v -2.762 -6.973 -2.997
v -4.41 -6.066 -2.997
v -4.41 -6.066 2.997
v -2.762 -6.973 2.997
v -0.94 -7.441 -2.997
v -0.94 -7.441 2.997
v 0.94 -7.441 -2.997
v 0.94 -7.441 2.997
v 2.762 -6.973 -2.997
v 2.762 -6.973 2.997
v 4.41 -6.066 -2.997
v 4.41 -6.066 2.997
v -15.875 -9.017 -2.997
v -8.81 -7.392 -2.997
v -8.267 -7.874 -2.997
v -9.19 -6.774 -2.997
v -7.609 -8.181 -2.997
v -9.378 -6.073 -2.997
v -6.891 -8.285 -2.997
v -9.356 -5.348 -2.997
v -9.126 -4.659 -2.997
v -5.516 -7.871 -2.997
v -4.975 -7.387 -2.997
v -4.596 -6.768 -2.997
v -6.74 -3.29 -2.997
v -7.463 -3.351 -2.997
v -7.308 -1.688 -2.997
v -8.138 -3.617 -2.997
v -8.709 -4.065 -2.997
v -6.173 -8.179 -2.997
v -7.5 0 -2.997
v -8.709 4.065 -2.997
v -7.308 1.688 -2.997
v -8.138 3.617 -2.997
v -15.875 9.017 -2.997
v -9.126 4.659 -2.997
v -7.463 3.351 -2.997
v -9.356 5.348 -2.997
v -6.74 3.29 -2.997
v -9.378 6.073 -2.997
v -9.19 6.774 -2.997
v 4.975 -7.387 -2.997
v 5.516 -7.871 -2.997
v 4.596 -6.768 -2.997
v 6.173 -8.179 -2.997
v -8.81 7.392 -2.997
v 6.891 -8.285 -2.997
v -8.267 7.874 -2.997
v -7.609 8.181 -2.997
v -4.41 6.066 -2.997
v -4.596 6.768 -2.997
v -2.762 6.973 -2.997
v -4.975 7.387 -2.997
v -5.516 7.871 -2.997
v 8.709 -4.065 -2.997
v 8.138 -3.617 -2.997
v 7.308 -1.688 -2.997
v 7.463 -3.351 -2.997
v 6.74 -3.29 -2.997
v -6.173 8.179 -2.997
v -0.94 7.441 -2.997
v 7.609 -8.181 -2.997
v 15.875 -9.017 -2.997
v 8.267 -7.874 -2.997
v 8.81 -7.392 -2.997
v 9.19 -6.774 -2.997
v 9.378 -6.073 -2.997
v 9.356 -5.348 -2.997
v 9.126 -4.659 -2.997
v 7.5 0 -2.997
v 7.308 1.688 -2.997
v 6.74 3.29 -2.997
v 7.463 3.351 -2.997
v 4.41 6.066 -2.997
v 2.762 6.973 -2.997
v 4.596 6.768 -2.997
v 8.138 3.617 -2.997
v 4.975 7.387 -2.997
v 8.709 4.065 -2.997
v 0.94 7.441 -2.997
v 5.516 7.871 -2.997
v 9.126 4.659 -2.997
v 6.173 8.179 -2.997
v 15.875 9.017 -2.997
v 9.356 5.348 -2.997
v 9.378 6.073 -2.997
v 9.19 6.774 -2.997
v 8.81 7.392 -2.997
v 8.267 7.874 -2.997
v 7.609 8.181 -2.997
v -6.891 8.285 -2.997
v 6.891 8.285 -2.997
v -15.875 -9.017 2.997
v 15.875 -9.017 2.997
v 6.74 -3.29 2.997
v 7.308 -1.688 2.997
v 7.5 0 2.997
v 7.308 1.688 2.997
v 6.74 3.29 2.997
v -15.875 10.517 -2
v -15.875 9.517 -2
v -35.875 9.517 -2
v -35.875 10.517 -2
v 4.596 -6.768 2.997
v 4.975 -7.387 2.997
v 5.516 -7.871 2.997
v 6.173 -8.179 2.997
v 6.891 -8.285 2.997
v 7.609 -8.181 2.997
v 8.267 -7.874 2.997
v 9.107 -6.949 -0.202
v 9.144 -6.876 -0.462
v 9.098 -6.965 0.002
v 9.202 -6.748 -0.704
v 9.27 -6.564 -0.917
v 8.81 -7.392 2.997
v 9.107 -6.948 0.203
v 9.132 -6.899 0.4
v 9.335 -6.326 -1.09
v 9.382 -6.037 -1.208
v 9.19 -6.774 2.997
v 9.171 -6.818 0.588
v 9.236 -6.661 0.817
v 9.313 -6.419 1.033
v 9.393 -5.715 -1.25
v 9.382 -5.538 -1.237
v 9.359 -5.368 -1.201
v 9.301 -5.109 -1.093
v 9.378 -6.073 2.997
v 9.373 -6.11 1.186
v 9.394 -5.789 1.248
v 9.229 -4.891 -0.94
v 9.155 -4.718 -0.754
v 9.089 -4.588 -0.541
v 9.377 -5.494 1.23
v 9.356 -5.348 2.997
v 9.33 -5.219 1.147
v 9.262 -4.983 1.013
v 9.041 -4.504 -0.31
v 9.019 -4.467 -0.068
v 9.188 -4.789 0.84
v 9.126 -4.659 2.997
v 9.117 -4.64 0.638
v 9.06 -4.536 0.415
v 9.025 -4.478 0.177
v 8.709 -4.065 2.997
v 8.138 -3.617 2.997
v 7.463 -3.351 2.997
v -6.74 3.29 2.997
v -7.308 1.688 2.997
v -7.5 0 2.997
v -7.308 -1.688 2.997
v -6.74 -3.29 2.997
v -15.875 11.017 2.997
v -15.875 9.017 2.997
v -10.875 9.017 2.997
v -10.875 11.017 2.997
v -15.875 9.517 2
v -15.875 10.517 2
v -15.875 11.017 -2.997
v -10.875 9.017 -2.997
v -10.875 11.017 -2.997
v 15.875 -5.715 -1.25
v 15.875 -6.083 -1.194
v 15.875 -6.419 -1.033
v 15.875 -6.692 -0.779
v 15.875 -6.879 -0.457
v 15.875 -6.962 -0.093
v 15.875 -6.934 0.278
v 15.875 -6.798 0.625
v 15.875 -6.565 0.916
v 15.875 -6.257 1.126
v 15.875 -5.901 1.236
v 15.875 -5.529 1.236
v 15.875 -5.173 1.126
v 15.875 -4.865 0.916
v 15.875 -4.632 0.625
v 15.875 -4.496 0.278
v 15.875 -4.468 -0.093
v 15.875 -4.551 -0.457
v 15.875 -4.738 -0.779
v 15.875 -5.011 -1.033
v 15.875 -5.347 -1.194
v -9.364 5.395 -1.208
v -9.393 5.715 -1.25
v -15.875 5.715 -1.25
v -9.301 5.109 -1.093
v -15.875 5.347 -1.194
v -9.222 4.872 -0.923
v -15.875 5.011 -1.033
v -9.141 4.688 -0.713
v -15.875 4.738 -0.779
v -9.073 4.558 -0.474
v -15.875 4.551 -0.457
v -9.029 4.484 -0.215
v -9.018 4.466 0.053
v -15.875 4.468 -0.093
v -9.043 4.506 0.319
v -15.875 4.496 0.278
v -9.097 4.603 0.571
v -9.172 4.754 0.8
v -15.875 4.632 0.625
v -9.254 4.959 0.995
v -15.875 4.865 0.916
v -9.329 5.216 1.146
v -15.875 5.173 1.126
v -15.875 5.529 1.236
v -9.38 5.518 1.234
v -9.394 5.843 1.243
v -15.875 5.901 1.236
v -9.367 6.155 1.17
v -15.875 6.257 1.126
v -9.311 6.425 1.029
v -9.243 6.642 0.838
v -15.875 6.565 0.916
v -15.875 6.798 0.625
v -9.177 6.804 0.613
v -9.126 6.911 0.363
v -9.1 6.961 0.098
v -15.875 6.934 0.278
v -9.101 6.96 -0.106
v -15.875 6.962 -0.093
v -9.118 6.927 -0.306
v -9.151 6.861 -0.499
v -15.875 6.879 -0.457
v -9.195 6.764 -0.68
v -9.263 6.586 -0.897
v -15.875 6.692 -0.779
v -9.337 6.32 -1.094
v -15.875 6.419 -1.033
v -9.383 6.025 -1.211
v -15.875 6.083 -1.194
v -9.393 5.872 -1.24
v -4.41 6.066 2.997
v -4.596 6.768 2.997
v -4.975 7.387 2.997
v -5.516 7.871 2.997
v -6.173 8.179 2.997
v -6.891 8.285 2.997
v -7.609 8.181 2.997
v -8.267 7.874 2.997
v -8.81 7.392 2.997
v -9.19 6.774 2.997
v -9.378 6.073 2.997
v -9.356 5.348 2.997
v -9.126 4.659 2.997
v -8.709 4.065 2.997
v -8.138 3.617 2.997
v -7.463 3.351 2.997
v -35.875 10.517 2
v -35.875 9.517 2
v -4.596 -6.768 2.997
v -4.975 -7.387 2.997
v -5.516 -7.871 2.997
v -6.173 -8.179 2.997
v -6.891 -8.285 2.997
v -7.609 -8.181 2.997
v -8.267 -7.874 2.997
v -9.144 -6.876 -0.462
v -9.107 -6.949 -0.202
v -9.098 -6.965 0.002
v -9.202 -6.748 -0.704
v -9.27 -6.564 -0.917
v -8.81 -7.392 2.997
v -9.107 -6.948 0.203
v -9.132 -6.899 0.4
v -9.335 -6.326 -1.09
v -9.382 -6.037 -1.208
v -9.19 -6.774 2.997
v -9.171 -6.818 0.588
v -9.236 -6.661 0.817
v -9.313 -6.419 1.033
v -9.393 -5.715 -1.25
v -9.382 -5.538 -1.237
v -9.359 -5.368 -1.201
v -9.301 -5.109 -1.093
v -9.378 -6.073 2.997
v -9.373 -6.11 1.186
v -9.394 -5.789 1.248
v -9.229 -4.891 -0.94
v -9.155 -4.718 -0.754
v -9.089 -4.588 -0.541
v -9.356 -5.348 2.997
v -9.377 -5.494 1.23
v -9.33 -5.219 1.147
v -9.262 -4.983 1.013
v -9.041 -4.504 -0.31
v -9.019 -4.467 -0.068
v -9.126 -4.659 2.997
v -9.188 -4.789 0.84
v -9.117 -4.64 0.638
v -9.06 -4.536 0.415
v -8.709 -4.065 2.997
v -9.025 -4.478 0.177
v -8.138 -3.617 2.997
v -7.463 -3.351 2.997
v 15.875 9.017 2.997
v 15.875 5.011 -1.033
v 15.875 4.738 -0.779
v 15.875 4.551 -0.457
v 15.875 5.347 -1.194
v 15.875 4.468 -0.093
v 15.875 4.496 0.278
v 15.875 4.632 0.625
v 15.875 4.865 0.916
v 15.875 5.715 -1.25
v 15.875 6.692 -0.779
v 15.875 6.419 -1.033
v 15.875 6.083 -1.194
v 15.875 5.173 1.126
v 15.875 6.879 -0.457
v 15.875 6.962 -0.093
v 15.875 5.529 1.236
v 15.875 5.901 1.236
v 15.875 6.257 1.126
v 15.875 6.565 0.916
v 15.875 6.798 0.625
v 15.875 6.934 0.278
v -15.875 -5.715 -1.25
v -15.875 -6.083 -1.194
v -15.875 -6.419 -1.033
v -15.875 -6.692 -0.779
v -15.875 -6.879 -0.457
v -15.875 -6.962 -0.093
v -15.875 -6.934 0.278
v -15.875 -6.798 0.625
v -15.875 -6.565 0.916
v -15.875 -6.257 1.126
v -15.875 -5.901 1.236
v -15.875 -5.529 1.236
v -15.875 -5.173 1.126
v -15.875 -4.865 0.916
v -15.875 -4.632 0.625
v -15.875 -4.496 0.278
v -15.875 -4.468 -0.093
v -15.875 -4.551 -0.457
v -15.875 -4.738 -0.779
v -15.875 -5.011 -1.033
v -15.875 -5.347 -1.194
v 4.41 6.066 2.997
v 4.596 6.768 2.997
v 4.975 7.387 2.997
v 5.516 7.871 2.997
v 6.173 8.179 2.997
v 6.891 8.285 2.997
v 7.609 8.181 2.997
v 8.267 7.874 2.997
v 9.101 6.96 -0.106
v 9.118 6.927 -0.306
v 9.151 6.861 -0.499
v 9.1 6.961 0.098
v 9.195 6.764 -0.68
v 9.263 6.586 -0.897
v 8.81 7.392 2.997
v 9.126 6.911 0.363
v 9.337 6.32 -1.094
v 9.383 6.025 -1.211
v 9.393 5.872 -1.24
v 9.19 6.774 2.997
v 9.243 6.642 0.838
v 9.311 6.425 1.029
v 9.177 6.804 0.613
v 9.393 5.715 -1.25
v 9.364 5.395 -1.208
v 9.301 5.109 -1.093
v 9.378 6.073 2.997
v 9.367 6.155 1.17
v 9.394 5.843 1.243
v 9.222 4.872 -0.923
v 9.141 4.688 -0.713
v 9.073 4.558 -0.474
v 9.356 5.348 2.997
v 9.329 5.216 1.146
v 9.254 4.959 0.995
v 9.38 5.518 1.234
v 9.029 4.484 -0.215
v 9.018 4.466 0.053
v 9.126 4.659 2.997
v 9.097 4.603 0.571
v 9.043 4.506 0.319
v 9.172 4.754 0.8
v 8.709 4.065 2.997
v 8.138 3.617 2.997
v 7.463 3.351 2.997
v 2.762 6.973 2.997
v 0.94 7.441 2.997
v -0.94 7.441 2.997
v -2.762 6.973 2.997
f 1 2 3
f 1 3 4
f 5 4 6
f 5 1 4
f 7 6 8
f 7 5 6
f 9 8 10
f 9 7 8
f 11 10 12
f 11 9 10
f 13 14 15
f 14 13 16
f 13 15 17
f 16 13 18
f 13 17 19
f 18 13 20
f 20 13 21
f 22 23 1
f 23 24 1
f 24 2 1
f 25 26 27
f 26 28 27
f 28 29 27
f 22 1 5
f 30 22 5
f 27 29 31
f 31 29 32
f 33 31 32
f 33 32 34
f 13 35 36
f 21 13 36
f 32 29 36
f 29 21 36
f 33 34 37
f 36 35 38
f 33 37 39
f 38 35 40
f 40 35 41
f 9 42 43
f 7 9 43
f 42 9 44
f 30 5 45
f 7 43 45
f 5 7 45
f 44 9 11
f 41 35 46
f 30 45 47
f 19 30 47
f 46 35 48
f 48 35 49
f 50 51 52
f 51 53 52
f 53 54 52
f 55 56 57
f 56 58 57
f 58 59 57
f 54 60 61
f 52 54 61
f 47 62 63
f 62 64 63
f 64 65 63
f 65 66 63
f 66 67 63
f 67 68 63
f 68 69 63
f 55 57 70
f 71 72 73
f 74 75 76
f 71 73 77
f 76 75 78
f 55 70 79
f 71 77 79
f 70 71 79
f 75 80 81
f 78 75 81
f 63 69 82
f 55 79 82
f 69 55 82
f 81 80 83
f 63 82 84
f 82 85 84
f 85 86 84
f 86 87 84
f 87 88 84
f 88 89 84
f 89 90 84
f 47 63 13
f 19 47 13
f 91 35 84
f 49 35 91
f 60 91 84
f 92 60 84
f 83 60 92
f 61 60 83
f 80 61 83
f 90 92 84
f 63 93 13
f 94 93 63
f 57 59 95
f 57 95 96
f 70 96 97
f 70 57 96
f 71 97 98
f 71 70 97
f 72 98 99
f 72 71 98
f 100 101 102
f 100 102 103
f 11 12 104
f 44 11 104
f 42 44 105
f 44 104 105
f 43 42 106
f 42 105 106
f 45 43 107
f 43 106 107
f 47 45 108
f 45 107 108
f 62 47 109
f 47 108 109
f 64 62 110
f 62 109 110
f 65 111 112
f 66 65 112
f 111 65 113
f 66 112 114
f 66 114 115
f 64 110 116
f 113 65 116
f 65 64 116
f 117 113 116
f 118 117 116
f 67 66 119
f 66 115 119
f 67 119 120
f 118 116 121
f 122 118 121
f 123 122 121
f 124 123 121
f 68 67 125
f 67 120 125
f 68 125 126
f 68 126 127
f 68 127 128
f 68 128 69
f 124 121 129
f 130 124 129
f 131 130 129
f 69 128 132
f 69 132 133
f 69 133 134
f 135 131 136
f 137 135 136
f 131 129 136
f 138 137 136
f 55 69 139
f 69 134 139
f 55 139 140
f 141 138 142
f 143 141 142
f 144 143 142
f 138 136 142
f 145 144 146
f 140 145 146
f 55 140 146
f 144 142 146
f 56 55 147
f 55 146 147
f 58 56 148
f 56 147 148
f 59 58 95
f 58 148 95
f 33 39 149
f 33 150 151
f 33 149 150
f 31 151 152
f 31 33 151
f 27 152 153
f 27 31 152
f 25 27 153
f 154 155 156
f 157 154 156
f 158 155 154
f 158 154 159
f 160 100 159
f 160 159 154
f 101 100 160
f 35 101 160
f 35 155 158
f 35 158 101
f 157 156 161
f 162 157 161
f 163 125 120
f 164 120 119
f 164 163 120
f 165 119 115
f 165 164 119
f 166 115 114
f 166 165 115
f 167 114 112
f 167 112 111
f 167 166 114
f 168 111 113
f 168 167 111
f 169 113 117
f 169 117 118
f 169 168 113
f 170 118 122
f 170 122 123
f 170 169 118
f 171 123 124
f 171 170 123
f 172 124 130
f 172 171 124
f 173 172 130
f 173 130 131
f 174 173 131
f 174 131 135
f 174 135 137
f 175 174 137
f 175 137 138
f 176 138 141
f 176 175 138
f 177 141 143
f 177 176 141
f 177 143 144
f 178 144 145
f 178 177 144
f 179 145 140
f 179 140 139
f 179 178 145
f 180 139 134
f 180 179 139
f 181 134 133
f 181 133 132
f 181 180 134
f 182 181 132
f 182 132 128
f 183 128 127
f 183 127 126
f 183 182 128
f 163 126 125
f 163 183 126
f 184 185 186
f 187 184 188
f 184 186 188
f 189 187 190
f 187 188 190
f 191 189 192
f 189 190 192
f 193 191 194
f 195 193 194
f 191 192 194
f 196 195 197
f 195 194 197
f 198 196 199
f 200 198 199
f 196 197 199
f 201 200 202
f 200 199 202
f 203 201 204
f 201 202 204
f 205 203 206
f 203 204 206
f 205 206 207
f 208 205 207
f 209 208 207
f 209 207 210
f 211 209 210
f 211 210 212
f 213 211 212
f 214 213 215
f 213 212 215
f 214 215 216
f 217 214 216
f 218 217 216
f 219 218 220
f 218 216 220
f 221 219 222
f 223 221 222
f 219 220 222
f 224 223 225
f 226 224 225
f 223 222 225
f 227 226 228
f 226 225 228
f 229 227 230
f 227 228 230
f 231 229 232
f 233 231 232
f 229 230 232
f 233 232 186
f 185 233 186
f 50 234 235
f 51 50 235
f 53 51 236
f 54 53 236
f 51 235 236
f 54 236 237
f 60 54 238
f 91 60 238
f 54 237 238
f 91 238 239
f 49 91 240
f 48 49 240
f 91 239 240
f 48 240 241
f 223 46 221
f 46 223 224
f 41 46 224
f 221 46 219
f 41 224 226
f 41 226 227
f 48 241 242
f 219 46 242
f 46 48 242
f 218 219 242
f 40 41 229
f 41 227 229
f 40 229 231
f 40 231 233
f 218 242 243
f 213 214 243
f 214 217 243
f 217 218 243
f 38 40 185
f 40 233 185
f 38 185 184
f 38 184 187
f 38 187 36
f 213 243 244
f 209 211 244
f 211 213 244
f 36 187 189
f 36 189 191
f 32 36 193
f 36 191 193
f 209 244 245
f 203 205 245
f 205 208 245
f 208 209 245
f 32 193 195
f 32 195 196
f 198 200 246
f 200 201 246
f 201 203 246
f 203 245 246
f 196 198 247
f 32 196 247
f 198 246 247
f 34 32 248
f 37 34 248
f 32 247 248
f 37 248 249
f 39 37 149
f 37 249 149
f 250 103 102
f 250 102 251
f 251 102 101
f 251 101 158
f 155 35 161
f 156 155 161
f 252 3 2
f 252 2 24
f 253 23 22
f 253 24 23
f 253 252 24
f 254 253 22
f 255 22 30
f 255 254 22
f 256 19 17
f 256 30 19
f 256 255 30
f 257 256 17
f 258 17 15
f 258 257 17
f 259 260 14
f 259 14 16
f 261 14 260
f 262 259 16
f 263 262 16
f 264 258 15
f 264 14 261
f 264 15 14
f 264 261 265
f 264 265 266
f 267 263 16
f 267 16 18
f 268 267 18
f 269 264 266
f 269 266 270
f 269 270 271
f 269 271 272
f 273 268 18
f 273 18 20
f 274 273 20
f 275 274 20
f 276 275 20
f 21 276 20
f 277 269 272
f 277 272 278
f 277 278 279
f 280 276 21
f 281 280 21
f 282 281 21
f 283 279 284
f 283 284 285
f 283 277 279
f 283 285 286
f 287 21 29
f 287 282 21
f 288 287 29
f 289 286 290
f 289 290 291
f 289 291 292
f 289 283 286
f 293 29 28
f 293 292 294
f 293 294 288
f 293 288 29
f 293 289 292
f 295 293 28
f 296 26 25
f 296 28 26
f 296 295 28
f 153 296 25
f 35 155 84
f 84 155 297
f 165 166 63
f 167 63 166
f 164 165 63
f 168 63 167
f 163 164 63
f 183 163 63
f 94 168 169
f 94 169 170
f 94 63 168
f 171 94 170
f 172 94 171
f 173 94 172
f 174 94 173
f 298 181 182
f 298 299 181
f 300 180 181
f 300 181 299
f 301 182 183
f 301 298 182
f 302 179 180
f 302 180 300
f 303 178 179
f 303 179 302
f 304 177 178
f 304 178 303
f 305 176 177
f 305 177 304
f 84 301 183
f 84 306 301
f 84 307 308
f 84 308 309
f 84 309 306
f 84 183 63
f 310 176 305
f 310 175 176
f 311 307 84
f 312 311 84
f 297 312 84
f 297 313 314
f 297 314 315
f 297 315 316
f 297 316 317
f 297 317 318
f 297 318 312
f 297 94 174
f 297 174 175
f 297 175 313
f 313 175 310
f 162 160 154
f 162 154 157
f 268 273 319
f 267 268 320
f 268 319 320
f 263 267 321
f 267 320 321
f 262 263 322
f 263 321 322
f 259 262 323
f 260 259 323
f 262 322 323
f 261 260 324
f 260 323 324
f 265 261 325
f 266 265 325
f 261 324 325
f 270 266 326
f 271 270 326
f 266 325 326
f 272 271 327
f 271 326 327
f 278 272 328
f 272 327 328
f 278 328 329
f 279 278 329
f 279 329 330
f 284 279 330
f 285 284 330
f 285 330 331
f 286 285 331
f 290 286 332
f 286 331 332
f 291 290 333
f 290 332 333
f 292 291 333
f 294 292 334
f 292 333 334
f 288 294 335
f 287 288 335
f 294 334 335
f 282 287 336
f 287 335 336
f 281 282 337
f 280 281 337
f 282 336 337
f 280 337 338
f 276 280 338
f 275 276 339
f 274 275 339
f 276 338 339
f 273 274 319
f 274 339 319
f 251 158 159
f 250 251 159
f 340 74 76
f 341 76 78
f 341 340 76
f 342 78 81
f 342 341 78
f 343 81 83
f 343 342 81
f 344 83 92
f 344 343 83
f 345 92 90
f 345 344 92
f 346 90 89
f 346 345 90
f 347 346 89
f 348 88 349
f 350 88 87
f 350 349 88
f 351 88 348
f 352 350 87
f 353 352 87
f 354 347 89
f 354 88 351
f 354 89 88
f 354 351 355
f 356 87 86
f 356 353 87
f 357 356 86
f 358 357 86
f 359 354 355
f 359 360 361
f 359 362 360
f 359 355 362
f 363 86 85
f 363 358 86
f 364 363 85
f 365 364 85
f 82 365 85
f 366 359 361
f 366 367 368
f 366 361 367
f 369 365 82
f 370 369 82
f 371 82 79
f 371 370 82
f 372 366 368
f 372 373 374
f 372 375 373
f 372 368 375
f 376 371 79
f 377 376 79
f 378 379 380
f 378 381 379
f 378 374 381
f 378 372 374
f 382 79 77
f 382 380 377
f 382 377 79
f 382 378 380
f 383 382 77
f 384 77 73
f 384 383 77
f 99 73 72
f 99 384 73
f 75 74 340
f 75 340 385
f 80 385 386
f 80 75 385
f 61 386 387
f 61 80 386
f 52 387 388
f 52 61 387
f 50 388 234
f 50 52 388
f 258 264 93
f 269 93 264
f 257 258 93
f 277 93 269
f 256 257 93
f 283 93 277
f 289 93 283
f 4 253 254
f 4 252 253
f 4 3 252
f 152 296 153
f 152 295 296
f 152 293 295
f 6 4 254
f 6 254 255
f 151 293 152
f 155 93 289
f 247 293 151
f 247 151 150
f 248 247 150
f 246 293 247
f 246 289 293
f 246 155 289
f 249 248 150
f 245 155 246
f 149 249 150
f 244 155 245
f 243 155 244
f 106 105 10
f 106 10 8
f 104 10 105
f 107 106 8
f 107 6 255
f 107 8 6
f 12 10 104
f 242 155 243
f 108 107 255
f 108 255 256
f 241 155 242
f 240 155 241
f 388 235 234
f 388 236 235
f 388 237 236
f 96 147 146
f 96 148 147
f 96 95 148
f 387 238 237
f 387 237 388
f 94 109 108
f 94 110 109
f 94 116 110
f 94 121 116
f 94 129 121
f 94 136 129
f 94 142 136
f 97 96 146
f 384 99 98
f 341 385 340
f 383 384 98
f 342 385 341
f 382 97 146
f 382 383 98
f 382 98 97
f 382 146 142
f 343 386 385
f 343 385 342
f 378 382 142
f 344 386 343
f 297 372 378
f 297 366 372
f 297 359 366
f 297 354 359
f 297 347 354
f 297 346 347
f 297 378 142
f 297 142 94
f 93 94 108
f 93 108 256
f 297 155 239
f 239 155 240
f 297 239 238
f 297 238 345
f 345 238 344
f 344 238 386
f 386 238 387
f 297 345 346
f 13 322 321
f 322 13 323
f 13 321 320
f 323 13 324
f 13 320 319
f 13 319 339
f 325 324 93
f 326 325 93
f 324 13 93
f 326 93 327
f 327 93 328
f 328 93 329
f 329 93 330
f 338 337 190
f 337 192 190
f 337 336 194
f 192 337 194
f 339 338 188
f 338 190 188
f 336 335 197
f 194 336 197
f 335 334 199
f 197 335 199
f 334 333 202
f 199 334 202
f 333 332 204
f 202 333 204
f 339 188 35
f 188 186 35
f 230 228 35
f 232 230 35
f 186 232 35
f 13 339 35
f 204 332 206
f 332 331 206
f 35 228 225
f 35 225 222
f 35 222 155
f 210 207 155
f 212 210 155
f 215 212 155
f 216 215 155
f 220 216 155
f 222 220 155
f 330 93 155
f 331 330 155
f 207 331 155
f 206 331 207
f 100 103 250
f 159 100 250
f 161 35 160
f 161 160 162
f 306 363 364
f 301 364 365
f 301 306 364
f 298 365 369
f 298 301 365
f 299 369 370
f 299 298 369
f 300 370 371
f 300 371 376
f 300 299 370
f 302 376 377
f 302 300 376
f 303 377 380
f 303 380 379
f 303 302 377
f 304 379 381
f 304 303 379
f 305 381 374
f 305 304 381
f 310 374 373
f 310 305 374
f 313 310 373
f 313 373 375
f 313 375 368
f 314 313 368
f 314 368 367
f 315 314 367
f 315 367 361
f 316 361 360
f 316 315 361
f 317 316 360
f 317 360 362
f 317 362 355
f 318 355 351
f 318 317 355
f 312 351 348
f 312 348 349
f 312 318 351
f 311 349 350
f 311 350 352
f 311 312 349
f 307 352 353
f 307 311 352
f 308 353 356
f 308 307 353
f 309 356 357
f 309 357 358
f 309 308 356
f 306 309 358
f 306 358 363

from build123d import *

# Parameters (mm, degrees)
SKETCH1_W                  = 31.75
SKETCH1_H                  = 18.034
BOSS_EXTRUDE1_DEPTH        = 2.9972
M3_TAPPED_HOLE1_AT_2_COUNT = 2
M3_TAPPED_HOLE1_AT_2_PITCH = 11.43
CUT_EXTRUDE1_DEPTH         = 19.501489719
CUT_EXTRUDE1_DEPTH_BACK    = 19.501489719
SKETCH4_R                  = 7.5
SKETCH5_R                  = 2.5
CUT_EXTRUDE2_DEPTH         = 19.501489719
MIRROR3_COPY_1_SKETCH_R    = 2.5
MIRROR3_COPY_1_DEPTH       = 19.501489719
SKETCH6_W                  = 5
SKETCH6_H                  = 5.9944
BOSS_EXTRUDE2_DEPTH        = 2
SKETCH7_W                  = 4
SKETCH7_H                  = 1
BOSS_EXTRUDE3_DEPTH        = 20


with BuildPart() as part:
    # Sketch1 → Boss-Extrude1 (new, symmetric)
    with BuildSketch(Plane.XY):
        Rectangle(SKETCH1_W, SKETCH1_H)
    extrude(amount=BOSS_EXTRUDE1_DEPTH, both=True)

    # Sketch3 → M3 Tapped Hole1 (revolve, cut)
    with BuildSketch(Plane(origin=(15.875, 5.715, 0), x_dir=(0, 0, -1), z_dir=(0, 1, 0))):
        Polygon((0, 0), (0, 9.251075774), (1.25, 8.5), (1.25, 0), align=None)
    m3_tapped_hole1 = revolve(axis=Axis((22.225, 5.715, 0), (-1, 0, 0)), mode=Mode.SUBTRACT)

    # M3 Tapped Hole1 at 2: M3 Tapped Hole1 ×2
    with Locations(*[(0, -i * M3_TAPPED_HOLE1_AT_2_PITCH, 0) for i in range(1, M3_TAPPED_HOLE1_AT_2_COUNT)]):
        add(m3_tapped_hole1, mode=Mode.SUBTRACT)

    # Mirror1: M3 Tapped Hole1 across plane
    add(m3_tapped_hole1.mirror(Plane(origin=(0, 0, 0), x_dir=(0, 0, 1), z_dir=(1, 0, 0))), mode=Mode.SUBTRACT)

    # Mirror1 copy 1 sketch → Mirror1 copy 1 (revolve, cut)
    with BuildSketch(Plane(origin=(-15.875, -5.715, 0), x_dir=(0, 0, -1), z_dir=(0, 1, 0))):
        Polygon((0, 0), (0, -9.251075774), (1.25, -8.5), (1.25, 0), align=None)
    revolve(axis=Axis((-22.225, -5.715, 0), (-1, 0, 0)), mode=Mode.SUBTRACT)

    # Sketch4 → Cut-Extrude1 (cut, two sides: drawn at the far end of the back side and taken through both)
    with BuildSketch(Plane.XY.offset(-CUT_EXTRUDE1_DEPTH_BACK)):
        Circle(SKETCH4_R)
    extrude(amount=CUT_EXTRUDE1_DEPTH + CUT_EXTRUDE1_DEPTH_BACK, mode=Mode.SUBTRACT)

    # Sketch5 → Cut-Extrude2 (cut, symmetric)
    with BuildSketch(Plane.XY):
        with Locations((-6.894399988, 5.785088487)):
            Circle(SKETCH5_R)
    cut_extrude2 = extrude(amount=CUT_EXTRUDE2_DEPTH, both=True, mode=Mode.SUBTRACT)

    # Mirror2: Cut-Extrude2 across plane
    add(cut_extrude2.mirror(Plane.ZX), mode=Mode.SUBTRACT)

    # Mirror3: Cut-Extrude2 across plane
    add(cut_extrude2.mirror(Plane(origin=(0, 0, 0), x_dir=(0, 0, 1), z_dir=(1, 0, 0))), mode=Mode.SUBTRACT)

    # Mirror3 copy 1 sketch → Mirror3 copy 1 (cut, symmetric)
    with BuildSketch(Plane(origin=(0, 0, 0), x_dir=(-1, 0, 0), z_dir=(0, 0, 1))):
        with Locations((-6.894399988, 5.785088487)):
            Circle(MIRROR3_COPY_1_SKETCH_R)
    extrude(amount=MIRROR3_COPY_1_DEPTH, both=True, mode=Mode.SUBTRACT)


with BuildPart() as body_2:
    # Sketch6 → Boss-Extrude2 (new body)
    with BuildSketch(Plane(origin=(0, 9.017, 0), x_dir=(1, 0, 0), z_dir=(0, 1, 0))):
        with Locations((-13.375, 0)):
            Rectangle(SKETCH6_W, SKETCH6_H)
    extrude(amount=BOSS_EXTRUDE2_DEPTH)

    # Sketch7 → Boss-Extrude3 (add)
    with BuildSketch(Plane.ZY.offset(15.875)):
        with Locations((0, 10.017)):
            Rectangle(SKETCH7_W, SKETCH7_H)
    extrude(amount=BOSS_EXTRUDE3_DEPTH)


solid = Compound([part.part, body_2.part])
